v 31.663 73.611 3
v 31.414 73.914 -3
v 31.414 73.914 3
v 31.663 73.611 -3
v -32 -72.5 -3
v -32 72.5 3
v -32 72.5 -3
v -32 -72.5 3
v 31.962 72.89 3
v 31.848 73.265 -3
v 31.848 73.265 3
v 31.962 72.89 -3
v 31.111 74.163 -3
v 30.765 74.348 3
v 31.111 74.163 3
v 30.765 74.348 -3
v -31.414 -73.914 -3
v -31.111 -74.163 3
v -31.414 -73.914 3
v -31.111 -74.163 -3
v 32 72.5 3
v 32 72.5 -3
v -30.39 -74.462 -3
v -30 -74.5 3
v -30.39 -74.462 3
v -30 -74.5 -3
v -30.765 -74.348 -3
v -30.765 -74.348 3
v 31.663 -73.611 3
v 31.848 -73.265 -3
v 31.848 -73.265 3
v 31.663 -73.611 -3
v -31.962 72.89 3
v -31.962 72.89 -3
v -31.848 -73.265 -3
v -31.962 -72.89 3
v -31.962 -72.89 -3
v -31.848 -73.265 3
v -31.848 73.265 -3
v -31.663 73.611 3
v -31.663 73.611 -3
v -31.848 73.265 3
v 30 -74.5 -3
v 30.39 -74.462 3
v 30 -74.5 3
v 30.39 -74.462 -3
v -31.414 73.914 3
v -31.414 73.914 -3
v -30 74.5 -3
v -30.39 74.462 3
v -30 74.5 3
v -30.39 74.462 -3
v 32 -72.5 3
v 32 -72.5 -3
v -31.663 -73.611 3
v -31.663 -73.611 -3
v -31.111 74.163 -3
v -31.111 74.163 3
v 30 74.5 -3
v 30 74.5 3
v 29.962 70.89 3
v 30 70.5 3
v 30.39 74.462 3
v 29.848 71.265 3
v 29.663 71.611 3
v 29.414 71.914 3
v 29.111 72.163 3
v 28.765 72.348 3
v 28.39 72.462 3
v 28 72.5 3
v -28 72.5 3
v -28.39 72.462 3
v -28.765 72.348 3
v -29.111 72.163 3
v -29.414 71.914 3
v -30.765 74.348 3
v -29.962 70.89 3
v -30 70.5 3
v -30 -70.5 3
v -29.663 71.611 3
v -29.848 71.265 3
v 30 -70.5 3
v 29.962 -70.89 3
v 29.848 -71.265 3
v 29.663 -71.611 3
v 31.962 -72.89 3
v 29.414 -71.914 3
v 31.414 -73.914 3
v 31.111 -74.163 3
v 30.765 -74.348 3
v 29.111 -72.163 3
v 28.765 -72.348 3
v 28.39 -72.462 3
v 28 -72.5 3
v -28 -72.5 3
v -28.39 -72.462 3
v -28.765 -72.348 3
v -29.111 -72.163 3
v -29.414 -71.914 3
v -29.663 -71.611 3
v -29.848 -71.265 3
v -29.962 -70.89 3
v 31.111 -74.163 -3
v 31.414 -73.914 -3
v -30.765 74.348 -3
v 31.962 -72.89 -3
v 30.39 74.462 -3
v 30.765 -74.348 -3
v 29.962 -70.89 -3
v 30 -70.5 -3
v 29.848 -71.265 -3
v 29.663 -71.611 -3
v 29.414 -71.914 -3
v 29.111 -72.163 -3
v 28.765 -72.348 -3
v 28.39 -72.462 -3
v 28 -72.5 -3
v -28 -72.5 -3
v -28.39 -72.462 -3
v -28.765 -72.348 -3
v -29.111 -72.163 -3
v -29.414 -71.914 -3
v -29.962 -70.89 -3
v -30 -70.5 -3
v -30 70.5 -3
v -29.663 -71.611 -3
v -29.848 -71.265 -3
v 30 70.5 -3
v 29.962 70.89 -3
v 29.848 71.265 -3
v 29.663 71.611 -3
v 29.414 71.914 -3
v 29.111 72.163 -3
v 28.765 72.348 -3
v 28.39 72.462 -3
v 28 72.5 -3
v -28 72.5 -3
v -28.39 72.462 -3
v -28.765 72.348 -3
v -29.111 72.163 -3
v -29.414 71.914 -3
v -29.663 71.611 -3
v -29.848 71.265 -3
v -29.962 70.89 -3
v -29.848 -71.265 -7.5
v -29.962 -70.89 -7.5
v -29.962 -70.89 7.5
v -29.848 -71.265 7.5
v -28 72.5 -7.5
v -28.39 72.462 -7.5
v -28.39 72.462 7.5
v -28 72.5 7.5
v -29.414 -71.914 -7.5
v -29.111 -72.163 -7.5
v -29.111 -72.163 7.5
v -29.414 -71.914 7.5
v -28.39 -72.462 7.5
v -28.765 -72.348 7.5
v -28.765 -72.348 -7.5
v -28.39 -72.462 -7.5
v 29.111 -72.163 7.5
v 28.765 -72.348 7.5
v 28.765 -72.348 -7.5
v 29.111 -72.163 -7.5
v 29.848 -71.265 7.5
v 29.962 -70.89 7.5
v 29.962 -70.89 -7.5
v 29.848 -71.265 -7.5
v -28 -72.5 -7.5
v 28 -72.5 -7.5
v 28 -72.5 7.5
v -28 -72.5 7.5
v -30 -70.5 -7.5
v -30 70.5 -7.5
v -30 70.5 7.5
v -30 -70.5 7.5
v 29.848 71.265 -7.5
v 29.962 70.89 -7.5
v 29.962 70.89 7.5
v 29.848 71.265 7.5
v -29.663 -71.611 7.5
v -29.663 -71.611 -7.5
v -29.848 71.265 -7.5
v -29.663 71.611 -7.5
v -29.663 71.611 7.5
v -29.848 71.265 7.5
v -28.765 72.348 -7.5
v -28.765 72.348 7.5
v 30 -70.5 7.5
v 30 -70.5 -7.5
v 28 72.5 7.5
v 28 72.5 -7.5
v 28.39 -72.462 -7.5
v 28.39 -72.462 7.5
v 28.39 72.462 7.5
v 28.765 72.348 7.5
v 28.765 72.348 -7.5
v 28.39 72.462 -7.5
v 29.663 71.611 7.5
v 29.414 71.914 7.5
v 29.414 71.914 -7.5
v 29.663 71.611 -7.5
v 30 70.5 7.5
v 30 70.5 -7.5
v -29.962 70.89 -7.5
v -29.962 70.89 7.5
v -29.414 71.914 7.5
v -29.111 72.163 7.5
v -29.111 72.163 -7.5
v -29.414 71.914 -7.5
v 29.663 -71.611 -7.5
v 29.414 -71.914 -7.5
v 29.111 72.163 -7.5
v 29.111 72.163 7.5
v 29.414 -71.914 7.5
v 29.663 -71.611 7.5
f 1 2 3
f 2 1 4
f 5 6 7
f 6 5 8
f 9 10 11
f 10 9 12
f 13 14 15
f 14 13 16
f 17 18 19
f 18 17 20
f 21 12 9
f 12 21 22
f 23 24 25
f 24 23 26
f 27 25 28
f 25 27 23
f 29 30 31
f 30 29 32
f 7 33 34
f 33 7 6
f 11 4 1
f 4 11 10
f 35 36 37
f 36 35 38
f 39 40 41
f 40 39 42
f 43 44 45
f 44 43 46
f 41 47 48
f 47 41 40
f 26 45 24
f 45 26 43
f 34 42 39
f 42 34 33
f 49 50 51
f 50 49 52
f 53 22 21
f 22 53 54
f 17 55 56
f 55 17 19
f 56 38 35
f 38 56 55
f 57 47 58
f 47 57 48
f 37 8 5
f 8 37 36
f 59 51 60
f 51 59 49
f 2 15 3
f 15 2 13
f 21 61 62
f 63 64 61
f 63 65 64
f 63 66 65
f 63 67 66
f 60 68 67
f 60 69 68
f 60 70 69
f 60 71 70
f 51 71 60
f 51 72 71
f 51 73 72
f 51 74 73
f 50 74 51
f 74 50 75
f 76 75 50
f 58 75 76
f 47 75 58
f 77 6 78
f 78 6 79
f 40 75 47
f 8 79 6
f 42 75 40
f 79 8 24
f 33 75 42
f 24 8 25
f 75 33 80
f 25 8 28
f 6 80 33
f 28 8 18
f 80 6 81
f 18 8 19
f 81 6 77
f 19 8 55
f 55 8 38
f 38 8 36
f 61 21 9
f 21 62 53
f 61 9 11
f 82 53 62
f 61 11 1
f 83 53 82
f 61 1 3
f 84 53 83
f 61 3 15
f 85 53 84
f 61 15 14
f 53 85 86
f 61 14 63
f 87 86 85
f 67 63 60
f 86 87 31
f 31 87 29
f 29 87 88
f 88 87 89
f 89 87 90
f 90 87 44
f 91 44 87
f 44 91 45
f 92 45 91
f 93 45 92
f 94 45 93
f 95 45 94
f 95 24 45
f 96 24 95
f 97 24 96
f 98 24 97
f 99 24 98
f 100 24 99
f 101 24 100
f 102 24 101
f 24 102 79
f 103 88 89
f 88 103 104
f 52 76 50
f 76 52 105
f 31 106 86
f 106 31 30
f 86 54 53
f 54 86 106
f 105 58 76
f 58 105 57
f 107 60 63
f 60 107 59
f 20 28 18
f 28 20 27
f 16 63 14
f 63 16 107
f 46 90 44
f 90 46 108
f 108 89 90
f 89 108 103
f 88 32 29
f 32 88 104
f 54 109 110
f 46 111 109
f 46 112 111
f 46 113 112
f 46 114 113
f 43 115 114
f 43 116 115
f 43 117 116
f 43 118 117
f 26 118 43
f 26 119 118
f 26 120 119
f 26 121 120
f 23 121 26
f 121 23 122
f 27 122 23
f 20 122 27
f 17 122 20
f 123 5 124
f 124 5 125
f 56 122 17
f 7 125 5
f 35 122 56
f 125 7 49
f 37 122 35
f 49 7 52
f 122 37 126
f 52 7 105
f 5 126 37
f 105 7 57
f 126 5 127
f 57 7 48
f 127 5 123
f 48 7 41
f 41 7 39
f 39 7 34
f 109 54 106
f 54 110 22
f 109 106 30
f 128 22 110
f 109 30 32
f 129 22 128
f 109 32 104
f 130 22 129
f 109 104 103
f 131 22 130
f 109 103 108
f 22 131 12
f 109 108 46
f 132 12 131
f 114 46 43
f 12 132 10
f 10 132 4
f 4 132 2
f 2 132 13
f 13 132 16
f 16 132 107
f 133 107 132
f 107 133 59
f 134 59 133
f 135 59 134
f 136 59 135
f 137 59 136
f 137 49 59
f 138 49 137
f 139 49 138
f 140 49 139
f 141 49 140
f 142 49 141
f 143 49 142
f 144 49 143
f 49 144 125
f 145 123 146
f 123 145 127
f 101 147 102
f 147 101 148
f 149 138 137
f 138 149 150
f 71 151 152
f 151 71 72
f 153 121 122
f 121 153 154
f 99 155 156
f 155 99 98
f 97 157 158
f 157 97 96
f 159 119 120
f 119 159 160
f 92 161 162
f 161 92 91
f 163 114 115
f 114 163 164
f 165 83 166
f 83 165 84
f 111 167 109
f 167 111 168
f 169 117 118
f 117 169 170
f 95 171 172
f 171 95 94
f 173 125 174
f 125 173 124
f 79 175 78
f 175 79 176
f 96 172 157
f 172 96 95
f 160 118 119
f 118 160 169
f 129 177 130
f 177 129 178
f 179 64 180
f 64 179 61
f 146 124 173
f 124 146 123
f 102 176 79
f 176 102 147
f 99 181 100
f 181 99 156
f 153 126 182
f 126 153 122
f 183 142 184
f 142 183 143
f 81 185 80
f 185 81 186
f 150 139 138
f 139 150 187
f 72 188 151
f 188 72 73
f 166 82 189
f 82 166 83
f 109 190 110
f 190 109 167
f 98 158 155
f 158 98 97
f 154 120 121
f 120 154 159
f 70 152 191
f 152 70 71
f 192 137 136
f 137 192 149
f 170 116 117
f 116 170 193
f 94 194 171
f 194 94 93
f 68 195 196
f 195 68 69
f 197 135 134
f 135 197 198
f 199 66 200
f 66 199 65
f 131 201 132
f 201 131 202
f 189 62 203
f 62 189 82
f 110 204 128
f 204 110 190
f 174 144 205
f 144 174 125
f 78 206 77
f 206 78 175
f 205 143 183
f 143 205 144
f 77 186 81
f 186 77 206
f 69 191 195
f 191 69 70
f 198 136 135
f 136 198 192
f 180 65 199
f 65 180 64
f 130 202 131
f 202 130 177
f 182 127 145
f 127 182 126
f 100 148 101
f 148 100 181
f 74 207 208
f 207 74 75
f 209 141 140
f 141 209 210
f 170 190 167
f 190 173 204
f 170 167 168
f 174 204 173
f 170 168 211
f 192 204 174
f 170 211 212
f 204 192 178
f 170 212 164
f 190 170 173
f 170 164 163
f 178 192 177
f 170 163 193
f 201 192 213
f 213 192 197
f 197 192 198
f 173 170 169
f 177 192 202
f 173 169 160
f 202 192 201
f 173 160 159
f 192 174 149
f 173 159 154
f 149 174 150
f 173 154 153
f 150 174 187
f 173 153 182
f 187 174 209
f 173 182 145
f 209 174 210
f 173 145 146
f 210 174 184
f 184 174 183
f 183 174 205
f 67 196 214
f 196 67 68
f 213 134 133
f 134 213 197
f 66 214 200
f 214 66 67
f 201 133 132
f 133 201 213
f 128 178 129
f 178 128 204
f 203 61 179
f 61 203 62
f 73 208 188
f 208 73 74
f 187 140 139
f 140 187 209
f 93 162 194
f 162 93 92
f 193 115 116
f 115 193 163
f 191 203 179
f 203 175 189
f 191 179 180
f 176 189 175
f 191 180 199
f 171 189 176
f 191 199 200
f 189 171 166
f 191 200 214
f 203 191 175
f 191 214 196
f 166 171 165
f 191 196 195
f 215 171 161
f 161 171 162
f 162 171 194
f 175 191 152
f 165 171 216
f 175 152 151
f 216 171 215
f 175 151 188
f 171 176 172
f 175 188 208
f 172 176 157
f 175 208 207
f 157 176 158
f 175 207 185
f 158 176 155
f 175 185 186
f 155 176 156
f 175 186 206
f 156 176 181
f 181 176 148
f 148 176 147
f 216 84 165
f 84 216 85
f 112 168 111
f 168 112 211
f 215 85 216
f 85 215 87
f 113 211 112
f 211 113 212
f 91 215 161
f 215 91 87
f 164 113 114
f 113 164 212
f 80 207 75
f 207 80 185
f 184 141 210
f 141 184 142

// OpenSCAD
// file: smartphone.scad
echo("Работа Пермякова Максима");
len_phone = 145;
width_phone = 60;
thickness_phone = 6;

corner_round = 9;

cube([width_phone, len_phone, thickness_phone], center=true);

module smartphone() {
hull() {
    color("red")
    translate([width_phone/2, len_phone/2, 0])
    cylinder(h=thickness_phone, d=corner_round, $fn=32, center=true);

    mirror([1,0,0])
    color("red")
    translate([width_phone/2, len_phone/2, 0])
    cylinder(h=thickness_phone, d=corner_round, $fn=32, center=true);

    mirror([0,1,0])
    color("red")
    translate([width_phone/2, len_phone/2, 0])
    cylinder(h=thickness_phone, d=corner_round, $fn=32, center=true);

    mirror([1,0,0])
    mirror([0,1,0])
    color("red")
    translate([width_phone/2, len_phone/2, 0])
    cylinder(h=thickness_phone, d=corner_round, $fn=32, center=true);
}

corner_round = 4;

hull() {
    color("red")
    translate([width_phone/2-corner_round/2, len_phone/2-corner_round/2, 0])
    cylinder(h=15, d=corner_round, $fn=32, center=true);

    mirror([1,0,0])
    color("red")
    translate([width_phone/2-corner_round/2, len_phone/2-corner_round/2, 0])
    cylinder(h=15, d=corner_round, $fn=32, center=true);

    mirror([0,1,0])
    color("red")
    translate([width_phone/2-corner_round/2, len_phone/2-corner_round/2, 0])
    cylinder(h=15, d=corner_round, $fn=32, center=true);

    mirror([1,0,0])
    mirror([0,1,0])
    color("red")
    translate([width_phone/2-corner_round/2, len_phone/2-corner_round/2, 0])
    cylinder(h=15, d=corner_round, $fn=32, center=true);
}
}
// main file
use <smartphone.scad>

echo("Работа Максима Пермякова");
smartphone();
